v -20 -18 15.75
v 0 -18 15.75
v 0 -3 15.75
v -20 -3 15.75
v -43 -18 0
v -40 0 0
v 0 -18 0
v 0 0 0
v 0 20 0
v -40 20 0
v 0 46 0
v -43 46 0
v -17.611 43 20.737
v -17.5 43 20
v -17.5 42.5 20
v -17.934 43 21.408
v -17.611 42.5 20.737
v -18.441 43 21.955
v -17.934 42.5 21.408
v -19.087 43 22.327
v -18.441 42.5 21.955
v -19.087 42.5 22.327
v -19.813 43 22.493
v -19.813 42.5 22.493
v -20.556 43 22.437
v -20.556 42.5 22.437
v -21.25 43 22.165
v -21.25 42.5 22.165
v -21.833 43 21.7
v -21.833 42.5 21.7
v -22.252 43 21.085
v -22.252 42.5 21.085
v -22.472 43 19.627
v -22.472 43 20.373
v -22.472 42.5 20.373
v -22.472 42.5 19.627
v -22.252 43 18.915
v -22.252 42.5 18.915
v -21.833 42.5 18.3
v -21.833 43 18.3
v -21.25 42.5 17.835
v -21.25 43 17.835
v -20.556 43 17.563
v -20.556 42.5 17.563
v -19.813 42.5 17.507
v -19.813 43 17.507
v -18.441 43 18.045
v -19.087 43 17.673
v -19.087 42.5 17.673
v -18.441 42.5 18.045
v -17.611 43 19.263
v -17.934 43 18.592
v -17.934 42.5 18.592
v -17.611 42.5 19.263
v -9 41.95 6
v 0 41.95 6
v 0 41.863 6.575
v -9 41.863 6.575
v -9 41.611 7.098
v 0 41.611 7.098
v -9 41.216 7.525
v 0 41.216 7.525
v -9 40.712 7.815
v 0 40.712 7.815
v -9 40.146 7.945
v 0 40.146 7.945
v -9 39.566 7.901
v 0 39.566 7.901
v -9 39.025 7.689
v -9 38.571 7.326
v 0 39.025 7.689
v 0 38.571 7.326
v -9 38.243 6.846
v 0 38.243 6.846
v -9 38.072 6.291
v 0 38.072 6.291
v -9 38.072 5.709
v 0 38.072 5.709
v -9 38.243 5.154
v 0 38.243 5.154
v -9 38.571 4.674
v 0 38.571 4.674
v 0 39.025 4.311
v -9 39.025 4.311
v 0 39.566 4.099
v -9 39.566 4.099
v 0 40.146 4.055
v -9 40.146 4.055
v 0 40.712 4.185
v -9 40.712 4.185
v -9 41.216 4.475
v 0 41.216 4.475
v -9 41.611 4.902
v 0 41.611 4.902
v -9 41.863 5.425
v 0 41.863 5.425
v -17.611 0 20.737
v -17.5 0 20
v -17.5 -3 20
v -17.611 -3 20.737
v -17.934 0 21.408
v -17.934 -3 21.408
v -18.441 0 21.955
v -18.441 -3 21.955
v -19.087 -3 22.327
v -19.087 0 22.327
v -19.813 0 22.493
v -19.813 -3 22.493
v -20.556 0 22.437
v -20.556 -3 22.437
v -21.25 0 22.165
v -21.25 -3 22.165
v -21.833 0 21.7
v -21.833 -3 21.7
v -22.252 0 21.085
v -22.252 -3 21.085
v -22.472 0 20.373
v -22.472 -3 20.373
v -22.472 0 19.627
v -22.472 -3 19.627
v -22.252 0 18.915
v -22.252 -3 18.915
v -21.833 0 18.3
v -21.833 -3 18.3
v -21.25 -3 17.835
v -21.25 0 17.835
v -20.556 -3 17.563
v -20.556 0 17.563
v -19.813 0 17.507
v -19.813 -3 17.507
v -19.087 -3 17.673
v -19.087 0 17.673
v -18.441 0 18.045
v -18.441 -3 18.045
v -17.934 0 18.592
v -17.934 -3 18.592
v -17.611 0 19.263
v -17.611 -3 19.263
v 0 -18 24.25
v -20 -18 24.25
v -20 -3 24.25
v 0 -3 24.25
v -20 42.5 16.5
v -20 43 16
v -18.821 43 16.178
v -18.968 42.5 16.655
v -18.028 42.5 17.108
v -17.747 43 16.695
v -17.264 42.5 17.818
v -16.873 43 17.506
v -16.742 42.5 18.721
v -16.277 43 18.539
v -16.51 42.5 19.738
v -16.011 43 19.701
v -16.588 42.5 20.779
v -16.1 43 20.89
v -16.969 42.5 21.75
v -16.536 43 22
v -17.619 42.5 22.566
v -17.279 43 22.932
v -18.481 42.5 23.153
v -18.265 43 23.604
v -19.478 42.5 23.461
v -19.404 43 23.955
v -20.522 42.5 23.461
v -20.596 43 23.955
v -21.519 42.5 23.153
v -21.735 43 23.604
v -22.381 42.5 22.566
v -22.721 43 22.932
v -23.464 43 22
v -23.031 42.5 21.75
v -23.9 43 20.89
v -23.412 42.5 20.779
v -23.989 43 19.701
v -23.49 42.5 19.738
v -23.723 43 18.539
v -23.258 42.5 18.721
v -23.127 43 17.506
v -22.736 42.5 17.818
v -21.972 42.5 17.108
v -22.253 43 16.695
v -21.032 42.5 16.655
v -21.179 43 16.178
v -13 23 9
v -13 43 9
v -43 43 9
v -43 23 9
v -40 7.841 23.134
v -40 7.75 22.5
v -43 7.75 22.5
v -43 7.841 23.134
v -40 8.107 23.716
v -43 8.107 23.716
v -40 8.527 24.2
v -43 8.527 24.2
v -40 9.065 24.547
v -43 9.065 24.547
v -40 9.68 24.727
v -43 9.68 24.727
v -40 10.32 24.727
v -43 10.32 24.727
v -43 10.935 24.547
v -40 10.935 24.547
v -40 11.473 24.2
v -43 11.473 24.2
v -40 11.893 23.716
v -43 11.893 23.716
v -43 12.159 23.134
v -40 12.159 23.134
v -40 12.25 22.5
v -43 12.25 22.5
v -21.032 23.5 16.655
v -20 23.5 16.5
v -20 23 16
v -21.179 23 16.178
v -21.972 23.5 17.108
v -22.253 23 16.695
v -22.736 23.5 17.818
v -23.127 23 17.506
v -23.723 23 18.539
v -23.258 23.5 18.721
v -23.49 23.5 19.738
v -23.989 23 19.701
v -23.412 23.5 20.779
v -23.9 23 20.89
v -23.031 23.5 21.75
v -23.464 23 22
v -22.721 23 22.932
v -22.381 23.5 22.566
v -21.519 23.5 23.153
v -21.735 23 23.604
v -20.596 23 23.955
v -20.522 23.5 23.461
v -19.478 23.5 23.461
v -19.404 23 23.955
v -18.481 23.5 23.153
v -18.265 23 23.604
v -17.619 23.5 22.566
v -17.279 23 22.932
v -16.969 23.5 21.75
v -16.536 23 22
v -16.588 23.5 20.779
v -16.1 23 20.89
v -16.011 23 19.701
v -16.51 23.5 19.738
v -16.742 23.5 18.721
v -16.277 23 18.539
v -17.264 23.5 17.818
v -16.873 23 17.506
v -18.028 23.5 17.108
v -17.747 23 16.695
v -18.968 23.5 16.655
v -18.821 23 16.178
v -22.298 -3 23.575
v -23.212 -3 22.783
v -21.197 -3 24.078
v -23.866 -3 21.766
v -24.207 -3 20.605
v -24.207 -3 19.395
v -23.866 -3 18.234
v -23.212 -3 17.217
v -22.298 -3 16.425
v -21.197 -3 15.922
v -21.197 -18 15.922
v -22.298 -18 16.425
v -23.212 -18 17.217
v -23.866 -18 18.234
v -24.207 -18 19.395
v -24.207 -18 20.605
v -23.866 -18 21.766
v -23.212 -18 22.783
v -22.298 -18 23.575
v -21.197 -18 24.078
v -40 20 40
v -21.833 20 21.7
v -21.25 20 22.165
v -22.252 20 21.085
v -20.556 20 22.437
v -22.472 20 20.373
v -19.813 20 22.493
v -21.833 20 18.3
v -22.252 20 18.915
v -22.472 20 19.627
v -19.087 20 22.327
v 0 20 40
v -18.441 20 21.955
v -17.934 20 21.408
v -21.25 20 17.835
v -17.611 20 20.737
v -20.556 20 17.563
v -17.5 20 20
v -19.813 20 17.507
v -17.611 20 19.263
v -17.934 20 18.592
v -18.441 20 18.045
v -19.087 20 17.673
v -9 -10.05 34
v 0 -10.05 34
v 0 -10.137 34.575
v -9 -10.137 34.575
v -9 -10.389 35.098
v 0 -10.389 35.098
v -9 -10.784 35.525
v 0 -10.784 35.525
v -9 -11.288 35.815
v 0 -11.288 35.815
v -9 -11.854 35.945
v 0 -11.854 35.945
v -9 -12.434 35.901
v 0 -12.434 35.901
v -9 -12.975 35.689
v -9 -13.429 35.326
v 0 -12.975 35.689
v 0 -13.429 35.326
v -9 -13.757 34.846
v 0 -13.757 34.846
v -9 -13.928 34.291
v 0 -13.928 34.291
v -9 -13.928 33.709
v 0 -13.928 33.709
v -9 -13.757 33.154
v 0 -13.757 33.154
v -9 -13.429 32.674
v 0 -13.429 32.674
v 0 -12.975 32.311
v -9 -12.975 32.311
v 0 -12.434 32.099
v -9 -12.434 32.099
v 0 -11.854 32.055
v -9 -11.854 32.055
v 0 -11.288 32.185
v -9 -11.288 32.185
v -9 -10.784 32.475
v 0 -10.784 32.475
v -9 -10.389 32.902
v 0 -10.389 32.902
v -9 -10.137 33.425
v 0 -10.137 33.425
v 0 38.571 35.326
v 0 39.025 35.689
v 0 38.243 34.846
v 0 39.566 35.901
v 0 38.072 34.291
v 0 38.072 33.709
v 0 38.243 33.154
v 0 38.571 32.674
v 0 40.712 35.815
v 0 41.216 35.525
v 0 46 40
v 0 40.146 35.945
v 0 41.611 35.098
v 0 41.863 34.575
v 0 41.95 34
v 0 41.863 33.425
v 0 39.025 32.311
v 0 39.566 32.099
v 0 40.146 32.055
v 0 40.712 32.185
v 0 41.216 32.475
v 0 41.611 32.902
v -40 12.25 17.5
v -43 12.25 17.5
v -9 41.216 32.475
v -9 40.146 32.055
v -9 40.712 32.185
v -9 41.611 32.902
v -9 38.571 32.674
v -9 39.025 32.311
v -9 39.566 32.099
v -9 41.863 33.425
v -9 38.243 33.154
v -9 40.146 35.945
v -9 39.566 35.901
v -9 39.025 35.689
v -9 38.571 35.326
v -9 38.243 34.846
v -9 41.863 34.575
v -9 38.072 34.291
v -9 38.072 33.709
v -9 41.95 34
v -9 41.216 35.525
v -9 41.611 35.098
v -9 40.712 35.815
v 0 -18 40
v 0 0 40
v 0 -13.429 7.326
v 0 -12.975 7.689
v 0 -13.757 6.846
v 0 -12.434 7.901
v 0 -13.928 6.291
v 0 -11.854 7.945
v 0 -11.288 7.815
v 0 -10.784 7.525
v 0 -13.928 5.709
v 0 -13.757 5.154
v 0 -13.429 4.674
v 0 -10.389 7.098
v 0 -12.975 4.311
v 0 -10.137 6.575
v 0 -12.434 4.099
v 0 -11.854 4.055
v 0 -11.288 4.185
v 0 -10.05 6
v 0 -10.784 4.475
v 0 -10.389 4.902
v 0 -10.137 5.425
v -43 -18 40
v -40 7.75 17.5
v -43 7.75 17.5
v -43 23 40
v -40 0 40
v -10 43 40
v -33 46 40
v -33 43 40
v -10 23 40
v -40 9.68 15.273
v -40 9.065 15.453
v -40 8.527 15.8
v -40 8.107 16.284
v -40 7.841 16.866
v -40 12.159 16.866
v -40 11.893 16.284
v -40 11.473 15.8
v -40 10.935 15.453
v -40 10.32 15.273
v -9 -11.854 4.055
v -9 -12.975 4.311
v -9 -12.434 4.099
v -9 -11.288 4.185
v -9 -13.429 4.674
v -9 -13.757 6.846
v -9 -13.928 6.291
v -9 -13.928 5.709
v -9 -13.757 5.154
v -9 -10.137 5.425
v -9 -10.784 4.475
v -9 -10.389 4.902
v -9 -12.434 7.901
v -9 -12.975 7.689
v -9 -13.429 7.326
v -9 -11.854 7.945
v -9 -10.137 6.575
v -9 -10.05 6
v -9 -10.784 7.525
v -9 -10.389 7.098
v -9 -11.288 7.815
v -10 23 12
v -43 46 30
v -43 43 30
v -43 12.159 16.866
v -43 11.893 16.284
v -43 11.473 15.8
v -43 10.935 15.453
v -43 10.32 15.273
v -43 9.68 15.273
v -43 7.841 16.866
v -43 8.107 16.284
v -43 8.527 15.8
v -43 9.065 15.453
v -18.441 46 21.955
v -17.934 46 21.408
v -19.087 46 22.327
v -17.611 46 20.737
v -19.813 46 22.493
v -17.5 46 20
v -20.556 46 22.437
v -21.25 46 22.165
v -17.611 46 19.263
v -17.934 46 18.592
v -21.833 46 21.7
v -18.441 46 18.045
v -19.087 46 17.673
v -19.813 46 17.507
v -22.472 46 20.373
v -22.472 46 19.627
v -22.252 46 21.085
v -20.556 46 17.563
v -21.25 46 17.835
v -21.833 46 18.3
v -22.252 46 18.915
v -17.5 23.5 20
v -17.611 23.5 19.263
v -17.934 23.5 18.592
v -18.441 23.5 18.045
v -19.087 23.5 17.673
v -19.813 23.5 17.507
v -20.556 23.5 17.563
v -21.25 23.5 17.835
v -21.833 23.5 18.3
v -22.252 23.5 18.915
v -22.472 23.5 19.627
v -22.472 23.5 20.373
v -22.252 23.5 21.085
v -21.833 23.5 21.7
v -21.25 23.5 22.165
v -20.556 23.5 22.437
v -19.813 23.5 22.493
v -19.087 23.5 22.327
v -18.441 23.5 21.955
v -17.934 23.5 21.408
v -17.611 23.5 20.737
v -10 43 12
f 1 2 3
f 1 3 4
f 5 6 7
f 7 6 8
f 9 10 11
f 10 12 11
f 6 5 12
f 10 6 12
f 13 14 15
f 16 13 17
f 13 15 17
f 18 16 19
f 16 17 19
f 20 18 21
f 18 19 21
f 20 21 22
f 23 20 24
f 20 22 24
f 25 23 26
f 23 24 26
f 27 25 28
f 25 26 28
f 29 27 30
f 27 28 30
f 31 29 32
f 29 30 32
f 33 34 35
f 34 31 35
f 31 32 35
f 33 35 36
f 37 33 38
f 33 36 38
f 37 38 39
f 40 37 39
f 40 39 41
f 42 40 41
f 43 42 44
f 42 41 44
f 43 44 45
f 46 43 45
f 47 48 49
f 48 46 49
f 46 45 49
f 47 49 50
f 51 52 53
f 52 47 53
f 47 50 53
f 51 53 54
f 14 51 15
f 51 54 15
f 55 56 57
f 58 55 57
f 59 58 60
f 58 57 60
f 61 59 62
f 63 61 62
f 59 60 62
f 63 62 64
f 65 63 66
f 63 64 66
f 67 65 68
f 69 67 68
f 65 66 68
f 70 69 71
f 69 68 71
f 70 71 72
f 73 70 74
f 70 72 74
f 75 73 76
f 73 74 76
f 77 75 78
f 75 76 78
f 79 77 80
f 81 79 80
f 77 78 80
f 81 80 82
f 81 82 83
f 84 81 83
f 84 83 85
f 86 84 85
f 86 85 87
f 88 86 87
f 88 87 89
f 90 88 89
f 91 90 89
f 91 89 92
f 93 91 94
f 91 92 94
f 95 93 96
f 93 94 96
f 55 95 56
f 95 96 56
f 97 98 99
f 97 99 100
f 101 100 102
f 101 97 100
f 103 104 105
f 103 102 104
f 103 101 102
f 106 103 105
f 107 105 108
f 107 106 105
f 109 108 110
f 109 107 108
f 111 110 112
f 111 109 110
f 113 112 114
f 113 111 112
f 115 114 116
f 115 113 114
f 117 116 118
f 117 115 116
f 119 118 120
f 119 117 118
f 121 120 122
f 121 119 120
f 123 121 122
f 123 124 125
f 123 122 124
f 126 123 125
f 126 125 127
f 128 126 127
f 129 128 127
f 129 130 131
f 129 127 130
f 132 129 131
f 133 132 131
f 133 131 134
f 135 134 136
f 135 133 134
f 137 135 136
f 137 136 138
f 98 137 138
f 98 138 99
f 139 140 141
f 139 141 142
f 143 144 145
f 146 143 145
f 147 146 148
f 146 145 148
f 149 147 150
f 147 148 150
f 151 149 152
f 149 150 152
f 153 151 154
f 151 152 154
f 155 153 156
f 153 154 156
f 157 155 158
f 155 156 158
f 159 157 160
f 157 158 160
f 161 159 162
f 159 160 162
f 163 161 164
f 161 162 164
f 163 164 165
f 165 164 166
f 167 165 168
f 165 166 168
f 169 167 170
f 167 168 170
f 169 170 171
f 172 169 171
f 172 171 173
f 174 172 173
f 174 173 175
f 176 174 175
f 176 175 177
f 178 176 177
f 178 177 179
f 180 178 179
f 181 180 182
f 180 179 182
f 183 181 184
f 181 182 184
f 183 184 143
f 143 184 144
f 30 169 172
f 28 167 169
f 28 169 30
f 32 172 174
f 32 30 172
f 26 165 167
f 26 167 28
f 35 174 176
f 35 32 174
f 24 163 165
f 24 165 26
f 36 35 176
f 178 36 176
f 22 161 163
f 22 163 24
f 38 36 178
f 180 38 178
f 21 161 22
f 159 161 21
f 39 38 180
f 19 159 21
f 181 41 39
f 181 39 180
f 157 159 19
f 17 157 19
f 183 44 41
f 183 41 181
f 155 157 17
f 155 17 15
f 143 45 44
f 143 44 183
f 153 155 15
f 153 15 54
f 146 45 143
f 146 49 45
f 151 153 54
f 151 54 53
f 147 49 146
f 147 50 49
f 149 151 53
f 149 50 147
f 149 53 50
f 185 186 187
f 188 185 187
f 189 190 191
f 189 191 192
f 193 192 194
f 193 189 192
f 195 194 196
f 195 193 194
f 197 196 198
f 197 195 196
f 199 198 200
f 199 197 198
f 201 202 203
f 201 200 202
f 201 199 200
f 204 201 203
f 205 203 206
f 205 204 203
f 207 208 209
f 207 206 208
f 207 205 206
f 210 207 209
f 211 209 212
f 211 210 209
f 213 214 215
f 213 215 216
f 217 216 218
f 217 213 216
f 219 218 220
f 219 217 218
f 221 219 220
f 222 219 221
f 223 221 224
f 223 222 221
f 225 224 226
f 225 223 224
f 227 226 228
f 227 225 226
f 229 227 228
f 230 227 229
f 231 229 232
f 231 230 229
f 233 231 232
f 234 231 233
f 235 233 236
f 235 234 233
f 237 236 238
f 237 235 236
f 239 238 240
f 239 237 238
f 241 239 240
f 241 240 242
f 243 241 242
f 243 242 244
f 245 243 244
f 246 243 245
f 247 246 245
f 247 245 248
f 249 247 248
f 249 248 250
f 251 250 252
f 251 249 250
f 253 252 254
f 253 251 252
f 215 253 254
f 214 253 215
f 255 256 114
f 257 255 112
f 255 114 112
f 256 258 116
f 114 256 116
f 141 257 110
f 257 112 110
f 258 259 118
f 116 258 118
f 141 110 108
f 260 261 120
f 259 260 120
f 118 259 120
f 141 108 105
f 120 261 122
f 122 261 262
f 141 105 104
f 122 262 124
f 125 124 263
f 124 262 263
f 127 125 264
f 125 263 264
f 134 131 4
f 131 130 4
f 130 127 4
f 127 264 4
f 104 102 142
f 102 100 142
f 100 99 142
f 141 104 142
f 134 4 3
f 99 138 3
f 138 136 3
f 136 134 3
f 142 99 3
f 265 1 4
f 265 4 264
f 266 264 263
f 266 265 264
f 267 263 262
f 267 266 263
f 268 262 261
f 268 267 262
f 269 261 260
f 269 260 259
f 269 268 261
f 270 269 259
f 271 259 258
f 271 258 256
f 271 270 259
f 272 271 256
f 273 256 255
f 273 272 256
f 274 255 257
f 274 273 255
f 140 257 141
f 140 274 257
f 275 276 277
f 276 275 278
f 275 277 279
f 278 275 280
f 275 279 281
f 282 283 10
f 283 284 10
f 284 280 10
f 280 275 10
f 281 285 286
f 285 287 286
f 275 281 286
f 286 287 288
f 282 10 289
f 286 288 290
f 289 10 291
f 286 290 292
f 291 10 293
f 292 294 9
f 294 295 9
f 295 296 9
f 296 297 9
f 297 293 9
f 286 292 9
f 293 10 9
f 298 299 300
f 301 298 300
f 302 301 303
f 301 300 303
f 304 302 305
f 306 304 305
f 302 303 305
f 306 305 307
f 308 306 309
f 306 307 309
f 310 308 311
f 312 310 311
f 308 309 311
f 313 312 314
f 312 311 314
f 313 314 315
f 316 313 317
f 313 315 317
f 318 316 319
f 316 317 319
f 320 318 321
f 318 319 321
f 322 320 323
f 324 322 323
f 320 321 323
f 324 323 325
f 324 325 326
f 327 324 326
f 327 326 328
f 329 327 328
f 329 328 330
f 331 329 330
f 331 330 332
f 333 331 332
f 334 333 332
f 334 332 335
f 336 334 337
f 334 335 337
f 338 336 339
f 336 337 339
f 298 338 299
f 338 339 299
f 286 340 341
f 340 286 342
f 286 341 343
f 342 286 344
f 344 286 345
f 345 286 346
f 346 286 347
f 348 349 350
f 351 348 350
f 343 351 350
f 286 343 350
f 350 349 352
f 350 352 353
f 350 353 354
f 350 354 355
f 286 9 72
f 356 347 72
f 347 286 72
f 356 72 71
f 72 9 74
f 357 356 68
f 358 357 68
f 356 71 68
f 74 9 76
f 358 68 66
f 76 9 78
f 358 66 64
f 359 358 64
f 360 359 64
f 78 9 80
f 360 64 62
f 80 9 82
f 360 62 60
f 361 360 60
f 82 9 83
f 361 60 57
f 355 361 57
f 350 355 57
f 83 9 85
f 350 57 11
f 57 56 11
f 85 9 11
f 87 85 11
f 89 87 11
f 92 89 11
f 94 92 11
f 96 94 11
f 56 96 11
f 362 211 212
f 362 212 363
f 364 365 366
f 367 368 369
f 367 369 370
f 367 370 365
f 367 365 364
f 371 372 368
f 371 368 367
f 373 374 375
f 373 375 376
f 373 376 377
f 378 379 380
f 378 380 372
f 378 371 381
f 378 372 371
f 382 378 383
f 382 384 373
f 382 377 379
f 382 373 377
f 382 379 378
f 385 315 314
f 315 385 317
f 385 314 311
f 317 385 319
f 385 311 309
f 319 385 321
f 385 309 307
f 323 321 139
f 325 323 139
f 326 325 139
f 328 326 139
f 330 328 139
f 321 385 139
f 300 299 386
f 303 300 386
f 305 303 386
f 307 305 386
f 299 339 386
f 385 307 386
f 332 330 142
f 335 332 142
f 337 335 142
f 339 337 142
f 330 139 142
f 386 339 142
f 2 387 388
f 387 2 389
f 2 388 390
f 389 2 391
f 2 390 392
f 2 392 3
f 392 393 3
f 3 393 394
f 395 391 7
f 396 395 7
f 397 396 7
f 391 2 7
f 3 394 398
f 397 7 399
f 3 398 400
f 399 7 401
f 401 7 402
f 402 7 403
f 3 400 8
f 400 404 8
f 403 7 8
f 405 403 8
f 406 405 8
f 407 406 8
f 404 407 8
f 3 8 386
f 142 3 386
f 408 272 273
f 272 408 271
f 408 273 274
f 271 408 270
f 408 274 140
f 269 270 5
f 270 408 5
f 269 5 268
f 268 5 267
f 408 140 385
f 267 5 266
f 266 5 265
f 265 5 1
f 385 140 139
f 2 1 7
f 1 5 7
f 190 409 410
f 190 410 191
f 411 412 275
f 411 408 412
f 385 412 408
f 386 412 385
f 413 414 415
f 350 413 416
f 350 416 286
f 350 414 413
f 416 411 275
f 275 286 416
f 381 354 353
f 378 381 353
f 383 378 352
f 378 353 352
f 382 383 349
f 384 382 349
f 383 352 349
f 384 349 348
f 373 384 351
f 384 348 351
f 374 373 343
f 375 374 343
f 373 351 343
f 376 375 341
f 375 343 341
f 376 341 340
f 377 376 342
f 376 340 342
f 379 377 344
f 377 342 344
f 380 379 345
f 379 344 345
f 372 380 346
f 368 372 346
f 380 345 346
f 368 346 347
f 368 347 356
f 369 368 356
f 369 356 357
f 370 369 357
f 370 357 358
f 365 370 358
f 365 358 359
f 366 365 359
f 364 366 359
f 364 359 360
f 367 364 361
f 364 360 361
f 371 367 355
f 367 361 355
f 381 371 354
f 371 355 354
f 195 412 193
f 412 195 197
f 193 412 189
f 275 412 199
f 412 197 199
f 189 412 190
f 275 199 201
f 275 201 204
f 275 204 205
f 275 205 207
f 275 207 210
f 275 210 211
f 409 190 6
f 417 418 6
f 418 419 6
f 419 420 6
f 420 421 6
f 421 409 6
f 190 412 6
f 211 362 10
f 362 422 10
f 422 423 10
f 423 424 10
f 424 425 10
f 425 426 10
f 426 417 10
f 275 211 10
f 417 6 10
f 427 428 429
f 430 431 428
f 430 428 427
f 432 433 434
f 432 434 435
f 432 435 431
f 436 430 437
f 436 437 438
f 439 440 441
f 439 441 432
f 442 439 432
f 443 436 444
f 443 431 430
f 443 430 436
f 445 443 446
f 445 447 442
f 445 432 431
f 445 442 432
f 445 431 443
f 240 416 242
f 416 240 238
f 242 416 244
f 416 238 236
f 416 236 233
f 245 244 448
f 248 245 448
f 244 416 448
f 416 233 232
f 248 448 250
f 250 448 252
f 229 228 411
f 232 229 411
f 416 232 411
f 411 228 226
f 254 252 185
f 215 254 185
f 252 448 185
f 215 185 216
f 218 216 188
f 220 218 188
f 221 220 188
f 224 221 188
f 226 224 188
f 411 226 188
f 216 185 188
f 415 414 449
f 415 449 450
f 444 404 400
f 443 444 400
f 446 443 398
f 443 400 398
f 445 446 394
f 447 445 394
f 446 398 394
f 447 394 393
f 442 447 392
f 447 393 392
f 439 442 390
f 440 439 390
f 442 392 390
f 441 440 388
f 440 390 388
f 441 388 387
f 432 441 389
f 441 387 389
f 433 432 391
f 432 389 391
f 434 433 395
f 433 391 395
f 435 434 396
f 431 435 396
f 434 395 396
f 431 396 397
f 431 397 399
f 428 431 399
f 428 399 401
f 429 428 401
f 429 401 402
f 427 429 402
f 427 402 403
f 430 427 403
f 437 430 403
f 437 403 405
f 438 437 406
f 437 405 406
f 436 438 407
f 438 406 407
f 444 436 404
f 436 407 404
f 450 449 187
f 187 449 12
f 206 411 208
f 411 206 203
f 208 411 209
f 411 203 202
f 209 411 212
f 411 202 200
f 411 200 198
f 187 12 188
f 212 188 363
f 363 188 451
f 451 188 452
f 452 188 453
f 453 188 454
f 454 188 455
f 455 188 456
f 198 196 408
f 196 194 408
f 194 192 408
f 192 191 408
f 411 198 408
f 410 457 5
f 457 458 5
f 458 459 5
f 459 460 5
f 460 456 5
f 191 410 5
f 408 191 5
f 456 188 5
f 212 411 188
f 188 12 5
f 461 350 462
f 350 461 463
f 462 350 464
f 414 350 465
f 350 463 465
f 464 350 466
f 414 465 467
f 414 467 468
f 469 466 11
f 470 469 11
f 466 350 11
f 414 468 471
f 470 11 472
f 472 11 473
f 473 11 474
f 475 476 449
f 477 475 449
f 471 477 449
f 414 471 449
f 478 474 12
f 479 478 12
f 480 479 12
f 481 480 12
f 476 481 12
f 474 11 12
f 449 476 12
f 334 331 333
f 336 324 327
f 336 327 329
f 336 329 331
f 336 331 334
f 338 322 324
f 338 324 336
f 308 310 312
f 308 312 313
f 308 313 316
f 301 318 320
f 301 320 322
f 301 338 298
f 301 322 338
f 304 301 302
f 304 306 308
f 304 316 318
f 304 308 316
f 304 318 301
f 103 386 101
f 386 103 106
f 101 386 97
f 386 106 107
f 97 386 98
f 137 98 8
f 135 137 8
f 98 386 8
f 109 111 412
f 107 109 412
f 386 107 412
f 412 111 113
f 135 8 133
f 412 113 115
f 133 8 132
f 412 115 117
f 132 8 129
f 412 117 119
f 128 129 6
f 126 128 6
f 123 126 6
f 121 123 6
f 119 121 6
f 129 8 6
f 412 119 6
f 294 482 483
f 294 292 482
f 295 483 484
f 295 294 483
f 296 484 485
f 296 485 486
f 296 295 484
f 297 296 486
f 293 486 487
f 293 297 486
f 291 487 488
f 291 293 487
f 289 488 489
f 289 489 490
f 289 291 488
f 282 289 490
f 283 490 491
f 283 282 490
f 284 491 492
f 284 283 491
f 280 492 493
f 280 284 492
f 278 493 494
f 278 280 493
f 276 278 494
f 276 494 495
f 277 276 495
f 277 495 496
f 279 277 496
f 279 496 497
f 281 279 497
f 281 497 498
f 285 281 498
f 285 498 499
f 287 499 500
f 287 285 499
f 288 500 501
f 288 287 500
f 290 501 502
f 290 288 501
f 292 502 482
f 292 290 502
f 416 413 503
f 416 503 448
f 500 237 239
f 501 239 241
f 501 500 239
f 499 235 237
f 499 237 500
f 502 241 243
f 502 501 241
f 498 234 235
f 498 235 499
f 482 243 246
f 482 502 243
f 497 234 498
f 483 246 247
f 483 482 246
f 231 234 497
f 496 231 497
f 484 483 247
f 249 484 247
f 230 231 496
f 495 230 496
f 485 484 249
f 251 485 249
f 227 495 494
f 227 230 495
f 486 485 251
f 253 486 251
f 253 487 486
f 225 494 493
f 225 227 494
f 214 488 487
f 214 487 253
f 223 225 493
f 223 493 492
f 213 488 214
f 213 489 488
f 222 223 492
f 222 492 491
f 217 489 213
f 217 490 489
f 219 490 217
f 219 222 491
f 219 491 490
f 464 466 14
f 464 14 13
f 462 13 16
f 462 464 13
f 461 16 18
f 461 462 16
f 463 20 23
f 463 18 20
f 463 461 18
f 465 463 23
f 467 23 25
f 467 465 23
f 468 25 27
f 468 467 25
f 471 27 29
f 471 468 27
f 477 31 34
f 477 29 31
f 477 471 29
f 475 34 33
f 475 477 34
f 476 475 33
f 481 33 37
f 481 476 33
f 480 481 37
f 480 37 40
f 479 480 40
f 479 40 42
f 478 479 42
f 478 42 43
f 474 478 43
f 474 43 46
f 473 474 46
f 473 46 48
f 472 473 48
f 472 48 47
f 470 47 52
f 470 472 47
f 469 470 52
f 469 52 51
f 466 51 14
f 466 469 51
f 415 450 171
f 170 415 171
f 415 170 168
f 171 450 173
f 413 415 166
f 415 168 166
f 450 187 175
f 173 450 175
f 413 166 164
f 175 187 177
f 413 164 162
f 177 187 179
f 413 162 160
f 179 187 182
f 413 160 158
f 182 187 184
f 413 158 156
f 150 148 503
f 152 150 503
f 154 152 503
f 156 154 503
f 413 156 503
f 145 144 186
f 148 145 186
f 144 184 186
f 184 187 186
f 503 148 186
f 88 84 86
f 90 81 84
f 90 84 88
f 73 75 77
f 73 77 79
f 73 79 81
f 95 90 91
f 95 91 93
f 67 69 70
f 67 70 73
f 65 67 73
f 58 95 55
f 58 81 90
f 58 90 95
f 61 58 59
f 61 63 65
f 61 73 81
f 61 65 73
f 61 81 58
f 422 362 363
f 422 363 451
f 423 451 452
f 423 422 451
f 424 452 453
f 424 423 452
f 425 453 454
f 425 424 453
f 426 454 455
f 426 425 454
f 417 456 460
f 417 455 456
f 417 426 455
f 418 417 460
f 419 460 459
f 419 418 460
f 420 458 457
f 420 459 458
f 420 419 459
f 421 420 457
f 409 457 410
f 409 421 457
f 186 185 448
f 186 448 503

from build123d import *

# Parameters (mm, degrees)
BOSS_EXTRUDE1_DEPTH     = 40
CUT_EXTRUDE1_DEPTH      = 70.94998213
CUT_EXTRUDE1_DEPTH_BACK = 70.94998213
SKETCH3_R               = 2.5
CUT_EXTRUDE2_DEPTH      = 15
SKETCH5_R               = 3.5
SKETCH5_R_2             = 2.5
BOSS_EXTRUDE2_DEPTH     = 0.5
BOSS_EXTRUDE3_START     = 0.5
SKETCH6_R               = 3.5
SKETCH6_R_2             = 2.5
BOSS_EXTRUDE3_DEPTH     = 0.5
CHAMFER1_SIZE           = 0.5
CUT_EXTRUDE3_DEPTH      = 4.159338157
SKETCH9_W               = 43
SKETCH9_H               = 23
BOSS_EXTRUDE4_DEPTH     = 9
CHAMFER2_SIZE           = 3
SKETCH8_R               = 1.95
CUT_EXTRUDE4_DEPTH      = 9
CHAMFER5_SIZE           = 10


with BuildPart() as part:
    # Sketch1 → Boss-Extrude1 (new body)
    with BuildSketch(Plane.XY):
        Polygon((0, 0), (-40, 0), (-40, 20), (0, 20), (0, 46), (-43, 46), (-43, 43), (-10, 43), (-10, 23), (-43, 23), (-43, -18), (0, -18), align=None)
    extrude(amount=BOSS_EXTRUDE1_DEPTH)

    # Sketch3 → Cut-Extrude1 (cut, two sides: drawn at the far end of the back side and taken through both)
    with BuildSketch(Plane(origin=(0, 20, 0), x_dir=(-1, 0, 0), z_dir=(0, -1, 0)).offset(-CUT_EXTRUDE1_DEPTH_BACK)):
        with Locations(Location((20, -20, 0), (0, 0, 180))):
            Circle(SKETCH3_R)
    extrude(amount=CUT_EXTRUDE1_DEPTH + CUT_EXTRUDE1_DEPTH_BACK, mode=Mode.SUBTRACT)

    # Sketch4 → Cut-Extrude2 (cut)
    with BuildSketch(Plane(origin=(0, -18, 0), x_dir=(-1, 0, 0), z_dir=(0, -1, 0))):
        with BuildLine():
            Line((20, -24.25), (0, -24.25))
            Line((0, -24.25), (0, -15.75))
            Line((0, -15.75), (20, -15.75))
            ThreePointArc((20, -15.75), (24.25, -20), (20, -24.25))
        make_face()
    extrude(amount=-CUT_EXTRUDE2_DEPTH, mode=Mode.SUBTRACT)

    # Sketch5 → Boss-Extrude2 (add)
    with BuildSketch(Plane(origin=(0, 23, 0), x_dir=(1, 0, 0), z_dir=(0, 1, 0))):
        with Locations(Location((-20, -20, 0), (0, 0, 90))):
            Circle(SKETCH5_R)
        with Locations((-20, -20)):
            Circle(SKETCH5_R_2, mode=Mode.SUBTRACT)
    extrude(amount=BOSS_EXTRUDE2_DEPTH)

    # Sketch6 → Boss-Extrude3 (add)
    with BuildSketch(Plane(origin=(0, 43, 0), x_dir=(-1, 0, 0), z_dir=(0, -1, 0)).offset(BOSS_EXTRUDE3_START)):
        with Locations(Location((20, -20, 0), (0, 0, 90))):
            Circle(SKETCH6_R)
        with Locations(Location((20, -20, 0), (0, 0, 180))):
            Circle(SKETCH6_R_2, mode=Mode.SUBTRACT)
    extrude(amount=-BOSS_EXTRUDE3_DEPTH)

    # Chamfer1
    chamfer1_edges = [part.edges().sort_by_distance(p)[0] for p in [
        (-20, 23, 23.5),
        (-20, 43, 23.5),
    ]]
    chamfer(chamfer1_edges, length=CHAMFER1_SIZE - 0.0001)  # a hair under: the kernel refuses the full size

    # Sketch7 → Cut-Extrude3 (cut)
    with BuildSketch(Plane(origin=(-40, 0, 0), x_dir=(0, 0, -1), z_dir=(1, 0, 0))):
        with BuildLine():
            Line((-22.5, 12.25), (-17.5, 12.25))
            ThreePointArc((-17.5, 12.25), (-15.25, 10), (-17.5, 7.75))
            Line((-17.5, 7.75), (-22.5, 7.75))
            ThreePointArc((-22.5, 7.75), (-24.75, 10), (-22.5, 12.25))
        make_face()
    extrude(amount=-CUT_EXTRUDE3_DEPTH, mode=Mode.SUBTRACT)

    # Sketch9 → Boss-Extrude4 (add)
    with BuildSketch(Plane(origin=(0, 0, 0), x_dir=(-1, 0, 0), z_dir=(0, 0, -1))):
        with Locations((21.5, 34.5)):
            Rectangle(SKETCH9_W, SKETCH9_H)
    extrude(amount=-BOSS_EXTRUDE4_DEPTH)

    # Chamfer2
    chamfer2_edges = [part.edges().sort_by_distance(p)[0] for p in [
        (-10, 33, 9),
    ]]
    chamfer(chamfer2_edges, length=CHAMFER2_SIZE)

    # Sketch8 → Cut-Extrude4 (cut)
    with BuildSketch(Plane(origin=(0, 0, 0), x_dir=(0, 0, -1), z_dir=(1, 0, 0))):
        with Locations(Location((-34, 40, 0), (0, 0, 90))):
            Circle(SKETCH8_R)
        with Locations(Location((-6, 40, 0), (0, 0, 90))):
            Circle(SKETCH8_R)
        with Locations(Location((-34, -12, 0), (0, 0, 90))):
            Circle(SKETCH8_R)
        with Locations(Location((-6, -12, 0), (0, 0, 90))):
            Circle(SKETCH8_R)
    extrude(amount=-CUT_EXTRUDE4_DEPTH, mode=Mode.SUBTRACT)

    # Chamfer5
    chamfer5_edges = [part.edges().sort_by_distance(p)[0] for p in [
        (-43, 44.5, 40),
    ]]
    chamfer(chamfer5_edges, length=CHAMFER5_SIZE)


solid = part.part
